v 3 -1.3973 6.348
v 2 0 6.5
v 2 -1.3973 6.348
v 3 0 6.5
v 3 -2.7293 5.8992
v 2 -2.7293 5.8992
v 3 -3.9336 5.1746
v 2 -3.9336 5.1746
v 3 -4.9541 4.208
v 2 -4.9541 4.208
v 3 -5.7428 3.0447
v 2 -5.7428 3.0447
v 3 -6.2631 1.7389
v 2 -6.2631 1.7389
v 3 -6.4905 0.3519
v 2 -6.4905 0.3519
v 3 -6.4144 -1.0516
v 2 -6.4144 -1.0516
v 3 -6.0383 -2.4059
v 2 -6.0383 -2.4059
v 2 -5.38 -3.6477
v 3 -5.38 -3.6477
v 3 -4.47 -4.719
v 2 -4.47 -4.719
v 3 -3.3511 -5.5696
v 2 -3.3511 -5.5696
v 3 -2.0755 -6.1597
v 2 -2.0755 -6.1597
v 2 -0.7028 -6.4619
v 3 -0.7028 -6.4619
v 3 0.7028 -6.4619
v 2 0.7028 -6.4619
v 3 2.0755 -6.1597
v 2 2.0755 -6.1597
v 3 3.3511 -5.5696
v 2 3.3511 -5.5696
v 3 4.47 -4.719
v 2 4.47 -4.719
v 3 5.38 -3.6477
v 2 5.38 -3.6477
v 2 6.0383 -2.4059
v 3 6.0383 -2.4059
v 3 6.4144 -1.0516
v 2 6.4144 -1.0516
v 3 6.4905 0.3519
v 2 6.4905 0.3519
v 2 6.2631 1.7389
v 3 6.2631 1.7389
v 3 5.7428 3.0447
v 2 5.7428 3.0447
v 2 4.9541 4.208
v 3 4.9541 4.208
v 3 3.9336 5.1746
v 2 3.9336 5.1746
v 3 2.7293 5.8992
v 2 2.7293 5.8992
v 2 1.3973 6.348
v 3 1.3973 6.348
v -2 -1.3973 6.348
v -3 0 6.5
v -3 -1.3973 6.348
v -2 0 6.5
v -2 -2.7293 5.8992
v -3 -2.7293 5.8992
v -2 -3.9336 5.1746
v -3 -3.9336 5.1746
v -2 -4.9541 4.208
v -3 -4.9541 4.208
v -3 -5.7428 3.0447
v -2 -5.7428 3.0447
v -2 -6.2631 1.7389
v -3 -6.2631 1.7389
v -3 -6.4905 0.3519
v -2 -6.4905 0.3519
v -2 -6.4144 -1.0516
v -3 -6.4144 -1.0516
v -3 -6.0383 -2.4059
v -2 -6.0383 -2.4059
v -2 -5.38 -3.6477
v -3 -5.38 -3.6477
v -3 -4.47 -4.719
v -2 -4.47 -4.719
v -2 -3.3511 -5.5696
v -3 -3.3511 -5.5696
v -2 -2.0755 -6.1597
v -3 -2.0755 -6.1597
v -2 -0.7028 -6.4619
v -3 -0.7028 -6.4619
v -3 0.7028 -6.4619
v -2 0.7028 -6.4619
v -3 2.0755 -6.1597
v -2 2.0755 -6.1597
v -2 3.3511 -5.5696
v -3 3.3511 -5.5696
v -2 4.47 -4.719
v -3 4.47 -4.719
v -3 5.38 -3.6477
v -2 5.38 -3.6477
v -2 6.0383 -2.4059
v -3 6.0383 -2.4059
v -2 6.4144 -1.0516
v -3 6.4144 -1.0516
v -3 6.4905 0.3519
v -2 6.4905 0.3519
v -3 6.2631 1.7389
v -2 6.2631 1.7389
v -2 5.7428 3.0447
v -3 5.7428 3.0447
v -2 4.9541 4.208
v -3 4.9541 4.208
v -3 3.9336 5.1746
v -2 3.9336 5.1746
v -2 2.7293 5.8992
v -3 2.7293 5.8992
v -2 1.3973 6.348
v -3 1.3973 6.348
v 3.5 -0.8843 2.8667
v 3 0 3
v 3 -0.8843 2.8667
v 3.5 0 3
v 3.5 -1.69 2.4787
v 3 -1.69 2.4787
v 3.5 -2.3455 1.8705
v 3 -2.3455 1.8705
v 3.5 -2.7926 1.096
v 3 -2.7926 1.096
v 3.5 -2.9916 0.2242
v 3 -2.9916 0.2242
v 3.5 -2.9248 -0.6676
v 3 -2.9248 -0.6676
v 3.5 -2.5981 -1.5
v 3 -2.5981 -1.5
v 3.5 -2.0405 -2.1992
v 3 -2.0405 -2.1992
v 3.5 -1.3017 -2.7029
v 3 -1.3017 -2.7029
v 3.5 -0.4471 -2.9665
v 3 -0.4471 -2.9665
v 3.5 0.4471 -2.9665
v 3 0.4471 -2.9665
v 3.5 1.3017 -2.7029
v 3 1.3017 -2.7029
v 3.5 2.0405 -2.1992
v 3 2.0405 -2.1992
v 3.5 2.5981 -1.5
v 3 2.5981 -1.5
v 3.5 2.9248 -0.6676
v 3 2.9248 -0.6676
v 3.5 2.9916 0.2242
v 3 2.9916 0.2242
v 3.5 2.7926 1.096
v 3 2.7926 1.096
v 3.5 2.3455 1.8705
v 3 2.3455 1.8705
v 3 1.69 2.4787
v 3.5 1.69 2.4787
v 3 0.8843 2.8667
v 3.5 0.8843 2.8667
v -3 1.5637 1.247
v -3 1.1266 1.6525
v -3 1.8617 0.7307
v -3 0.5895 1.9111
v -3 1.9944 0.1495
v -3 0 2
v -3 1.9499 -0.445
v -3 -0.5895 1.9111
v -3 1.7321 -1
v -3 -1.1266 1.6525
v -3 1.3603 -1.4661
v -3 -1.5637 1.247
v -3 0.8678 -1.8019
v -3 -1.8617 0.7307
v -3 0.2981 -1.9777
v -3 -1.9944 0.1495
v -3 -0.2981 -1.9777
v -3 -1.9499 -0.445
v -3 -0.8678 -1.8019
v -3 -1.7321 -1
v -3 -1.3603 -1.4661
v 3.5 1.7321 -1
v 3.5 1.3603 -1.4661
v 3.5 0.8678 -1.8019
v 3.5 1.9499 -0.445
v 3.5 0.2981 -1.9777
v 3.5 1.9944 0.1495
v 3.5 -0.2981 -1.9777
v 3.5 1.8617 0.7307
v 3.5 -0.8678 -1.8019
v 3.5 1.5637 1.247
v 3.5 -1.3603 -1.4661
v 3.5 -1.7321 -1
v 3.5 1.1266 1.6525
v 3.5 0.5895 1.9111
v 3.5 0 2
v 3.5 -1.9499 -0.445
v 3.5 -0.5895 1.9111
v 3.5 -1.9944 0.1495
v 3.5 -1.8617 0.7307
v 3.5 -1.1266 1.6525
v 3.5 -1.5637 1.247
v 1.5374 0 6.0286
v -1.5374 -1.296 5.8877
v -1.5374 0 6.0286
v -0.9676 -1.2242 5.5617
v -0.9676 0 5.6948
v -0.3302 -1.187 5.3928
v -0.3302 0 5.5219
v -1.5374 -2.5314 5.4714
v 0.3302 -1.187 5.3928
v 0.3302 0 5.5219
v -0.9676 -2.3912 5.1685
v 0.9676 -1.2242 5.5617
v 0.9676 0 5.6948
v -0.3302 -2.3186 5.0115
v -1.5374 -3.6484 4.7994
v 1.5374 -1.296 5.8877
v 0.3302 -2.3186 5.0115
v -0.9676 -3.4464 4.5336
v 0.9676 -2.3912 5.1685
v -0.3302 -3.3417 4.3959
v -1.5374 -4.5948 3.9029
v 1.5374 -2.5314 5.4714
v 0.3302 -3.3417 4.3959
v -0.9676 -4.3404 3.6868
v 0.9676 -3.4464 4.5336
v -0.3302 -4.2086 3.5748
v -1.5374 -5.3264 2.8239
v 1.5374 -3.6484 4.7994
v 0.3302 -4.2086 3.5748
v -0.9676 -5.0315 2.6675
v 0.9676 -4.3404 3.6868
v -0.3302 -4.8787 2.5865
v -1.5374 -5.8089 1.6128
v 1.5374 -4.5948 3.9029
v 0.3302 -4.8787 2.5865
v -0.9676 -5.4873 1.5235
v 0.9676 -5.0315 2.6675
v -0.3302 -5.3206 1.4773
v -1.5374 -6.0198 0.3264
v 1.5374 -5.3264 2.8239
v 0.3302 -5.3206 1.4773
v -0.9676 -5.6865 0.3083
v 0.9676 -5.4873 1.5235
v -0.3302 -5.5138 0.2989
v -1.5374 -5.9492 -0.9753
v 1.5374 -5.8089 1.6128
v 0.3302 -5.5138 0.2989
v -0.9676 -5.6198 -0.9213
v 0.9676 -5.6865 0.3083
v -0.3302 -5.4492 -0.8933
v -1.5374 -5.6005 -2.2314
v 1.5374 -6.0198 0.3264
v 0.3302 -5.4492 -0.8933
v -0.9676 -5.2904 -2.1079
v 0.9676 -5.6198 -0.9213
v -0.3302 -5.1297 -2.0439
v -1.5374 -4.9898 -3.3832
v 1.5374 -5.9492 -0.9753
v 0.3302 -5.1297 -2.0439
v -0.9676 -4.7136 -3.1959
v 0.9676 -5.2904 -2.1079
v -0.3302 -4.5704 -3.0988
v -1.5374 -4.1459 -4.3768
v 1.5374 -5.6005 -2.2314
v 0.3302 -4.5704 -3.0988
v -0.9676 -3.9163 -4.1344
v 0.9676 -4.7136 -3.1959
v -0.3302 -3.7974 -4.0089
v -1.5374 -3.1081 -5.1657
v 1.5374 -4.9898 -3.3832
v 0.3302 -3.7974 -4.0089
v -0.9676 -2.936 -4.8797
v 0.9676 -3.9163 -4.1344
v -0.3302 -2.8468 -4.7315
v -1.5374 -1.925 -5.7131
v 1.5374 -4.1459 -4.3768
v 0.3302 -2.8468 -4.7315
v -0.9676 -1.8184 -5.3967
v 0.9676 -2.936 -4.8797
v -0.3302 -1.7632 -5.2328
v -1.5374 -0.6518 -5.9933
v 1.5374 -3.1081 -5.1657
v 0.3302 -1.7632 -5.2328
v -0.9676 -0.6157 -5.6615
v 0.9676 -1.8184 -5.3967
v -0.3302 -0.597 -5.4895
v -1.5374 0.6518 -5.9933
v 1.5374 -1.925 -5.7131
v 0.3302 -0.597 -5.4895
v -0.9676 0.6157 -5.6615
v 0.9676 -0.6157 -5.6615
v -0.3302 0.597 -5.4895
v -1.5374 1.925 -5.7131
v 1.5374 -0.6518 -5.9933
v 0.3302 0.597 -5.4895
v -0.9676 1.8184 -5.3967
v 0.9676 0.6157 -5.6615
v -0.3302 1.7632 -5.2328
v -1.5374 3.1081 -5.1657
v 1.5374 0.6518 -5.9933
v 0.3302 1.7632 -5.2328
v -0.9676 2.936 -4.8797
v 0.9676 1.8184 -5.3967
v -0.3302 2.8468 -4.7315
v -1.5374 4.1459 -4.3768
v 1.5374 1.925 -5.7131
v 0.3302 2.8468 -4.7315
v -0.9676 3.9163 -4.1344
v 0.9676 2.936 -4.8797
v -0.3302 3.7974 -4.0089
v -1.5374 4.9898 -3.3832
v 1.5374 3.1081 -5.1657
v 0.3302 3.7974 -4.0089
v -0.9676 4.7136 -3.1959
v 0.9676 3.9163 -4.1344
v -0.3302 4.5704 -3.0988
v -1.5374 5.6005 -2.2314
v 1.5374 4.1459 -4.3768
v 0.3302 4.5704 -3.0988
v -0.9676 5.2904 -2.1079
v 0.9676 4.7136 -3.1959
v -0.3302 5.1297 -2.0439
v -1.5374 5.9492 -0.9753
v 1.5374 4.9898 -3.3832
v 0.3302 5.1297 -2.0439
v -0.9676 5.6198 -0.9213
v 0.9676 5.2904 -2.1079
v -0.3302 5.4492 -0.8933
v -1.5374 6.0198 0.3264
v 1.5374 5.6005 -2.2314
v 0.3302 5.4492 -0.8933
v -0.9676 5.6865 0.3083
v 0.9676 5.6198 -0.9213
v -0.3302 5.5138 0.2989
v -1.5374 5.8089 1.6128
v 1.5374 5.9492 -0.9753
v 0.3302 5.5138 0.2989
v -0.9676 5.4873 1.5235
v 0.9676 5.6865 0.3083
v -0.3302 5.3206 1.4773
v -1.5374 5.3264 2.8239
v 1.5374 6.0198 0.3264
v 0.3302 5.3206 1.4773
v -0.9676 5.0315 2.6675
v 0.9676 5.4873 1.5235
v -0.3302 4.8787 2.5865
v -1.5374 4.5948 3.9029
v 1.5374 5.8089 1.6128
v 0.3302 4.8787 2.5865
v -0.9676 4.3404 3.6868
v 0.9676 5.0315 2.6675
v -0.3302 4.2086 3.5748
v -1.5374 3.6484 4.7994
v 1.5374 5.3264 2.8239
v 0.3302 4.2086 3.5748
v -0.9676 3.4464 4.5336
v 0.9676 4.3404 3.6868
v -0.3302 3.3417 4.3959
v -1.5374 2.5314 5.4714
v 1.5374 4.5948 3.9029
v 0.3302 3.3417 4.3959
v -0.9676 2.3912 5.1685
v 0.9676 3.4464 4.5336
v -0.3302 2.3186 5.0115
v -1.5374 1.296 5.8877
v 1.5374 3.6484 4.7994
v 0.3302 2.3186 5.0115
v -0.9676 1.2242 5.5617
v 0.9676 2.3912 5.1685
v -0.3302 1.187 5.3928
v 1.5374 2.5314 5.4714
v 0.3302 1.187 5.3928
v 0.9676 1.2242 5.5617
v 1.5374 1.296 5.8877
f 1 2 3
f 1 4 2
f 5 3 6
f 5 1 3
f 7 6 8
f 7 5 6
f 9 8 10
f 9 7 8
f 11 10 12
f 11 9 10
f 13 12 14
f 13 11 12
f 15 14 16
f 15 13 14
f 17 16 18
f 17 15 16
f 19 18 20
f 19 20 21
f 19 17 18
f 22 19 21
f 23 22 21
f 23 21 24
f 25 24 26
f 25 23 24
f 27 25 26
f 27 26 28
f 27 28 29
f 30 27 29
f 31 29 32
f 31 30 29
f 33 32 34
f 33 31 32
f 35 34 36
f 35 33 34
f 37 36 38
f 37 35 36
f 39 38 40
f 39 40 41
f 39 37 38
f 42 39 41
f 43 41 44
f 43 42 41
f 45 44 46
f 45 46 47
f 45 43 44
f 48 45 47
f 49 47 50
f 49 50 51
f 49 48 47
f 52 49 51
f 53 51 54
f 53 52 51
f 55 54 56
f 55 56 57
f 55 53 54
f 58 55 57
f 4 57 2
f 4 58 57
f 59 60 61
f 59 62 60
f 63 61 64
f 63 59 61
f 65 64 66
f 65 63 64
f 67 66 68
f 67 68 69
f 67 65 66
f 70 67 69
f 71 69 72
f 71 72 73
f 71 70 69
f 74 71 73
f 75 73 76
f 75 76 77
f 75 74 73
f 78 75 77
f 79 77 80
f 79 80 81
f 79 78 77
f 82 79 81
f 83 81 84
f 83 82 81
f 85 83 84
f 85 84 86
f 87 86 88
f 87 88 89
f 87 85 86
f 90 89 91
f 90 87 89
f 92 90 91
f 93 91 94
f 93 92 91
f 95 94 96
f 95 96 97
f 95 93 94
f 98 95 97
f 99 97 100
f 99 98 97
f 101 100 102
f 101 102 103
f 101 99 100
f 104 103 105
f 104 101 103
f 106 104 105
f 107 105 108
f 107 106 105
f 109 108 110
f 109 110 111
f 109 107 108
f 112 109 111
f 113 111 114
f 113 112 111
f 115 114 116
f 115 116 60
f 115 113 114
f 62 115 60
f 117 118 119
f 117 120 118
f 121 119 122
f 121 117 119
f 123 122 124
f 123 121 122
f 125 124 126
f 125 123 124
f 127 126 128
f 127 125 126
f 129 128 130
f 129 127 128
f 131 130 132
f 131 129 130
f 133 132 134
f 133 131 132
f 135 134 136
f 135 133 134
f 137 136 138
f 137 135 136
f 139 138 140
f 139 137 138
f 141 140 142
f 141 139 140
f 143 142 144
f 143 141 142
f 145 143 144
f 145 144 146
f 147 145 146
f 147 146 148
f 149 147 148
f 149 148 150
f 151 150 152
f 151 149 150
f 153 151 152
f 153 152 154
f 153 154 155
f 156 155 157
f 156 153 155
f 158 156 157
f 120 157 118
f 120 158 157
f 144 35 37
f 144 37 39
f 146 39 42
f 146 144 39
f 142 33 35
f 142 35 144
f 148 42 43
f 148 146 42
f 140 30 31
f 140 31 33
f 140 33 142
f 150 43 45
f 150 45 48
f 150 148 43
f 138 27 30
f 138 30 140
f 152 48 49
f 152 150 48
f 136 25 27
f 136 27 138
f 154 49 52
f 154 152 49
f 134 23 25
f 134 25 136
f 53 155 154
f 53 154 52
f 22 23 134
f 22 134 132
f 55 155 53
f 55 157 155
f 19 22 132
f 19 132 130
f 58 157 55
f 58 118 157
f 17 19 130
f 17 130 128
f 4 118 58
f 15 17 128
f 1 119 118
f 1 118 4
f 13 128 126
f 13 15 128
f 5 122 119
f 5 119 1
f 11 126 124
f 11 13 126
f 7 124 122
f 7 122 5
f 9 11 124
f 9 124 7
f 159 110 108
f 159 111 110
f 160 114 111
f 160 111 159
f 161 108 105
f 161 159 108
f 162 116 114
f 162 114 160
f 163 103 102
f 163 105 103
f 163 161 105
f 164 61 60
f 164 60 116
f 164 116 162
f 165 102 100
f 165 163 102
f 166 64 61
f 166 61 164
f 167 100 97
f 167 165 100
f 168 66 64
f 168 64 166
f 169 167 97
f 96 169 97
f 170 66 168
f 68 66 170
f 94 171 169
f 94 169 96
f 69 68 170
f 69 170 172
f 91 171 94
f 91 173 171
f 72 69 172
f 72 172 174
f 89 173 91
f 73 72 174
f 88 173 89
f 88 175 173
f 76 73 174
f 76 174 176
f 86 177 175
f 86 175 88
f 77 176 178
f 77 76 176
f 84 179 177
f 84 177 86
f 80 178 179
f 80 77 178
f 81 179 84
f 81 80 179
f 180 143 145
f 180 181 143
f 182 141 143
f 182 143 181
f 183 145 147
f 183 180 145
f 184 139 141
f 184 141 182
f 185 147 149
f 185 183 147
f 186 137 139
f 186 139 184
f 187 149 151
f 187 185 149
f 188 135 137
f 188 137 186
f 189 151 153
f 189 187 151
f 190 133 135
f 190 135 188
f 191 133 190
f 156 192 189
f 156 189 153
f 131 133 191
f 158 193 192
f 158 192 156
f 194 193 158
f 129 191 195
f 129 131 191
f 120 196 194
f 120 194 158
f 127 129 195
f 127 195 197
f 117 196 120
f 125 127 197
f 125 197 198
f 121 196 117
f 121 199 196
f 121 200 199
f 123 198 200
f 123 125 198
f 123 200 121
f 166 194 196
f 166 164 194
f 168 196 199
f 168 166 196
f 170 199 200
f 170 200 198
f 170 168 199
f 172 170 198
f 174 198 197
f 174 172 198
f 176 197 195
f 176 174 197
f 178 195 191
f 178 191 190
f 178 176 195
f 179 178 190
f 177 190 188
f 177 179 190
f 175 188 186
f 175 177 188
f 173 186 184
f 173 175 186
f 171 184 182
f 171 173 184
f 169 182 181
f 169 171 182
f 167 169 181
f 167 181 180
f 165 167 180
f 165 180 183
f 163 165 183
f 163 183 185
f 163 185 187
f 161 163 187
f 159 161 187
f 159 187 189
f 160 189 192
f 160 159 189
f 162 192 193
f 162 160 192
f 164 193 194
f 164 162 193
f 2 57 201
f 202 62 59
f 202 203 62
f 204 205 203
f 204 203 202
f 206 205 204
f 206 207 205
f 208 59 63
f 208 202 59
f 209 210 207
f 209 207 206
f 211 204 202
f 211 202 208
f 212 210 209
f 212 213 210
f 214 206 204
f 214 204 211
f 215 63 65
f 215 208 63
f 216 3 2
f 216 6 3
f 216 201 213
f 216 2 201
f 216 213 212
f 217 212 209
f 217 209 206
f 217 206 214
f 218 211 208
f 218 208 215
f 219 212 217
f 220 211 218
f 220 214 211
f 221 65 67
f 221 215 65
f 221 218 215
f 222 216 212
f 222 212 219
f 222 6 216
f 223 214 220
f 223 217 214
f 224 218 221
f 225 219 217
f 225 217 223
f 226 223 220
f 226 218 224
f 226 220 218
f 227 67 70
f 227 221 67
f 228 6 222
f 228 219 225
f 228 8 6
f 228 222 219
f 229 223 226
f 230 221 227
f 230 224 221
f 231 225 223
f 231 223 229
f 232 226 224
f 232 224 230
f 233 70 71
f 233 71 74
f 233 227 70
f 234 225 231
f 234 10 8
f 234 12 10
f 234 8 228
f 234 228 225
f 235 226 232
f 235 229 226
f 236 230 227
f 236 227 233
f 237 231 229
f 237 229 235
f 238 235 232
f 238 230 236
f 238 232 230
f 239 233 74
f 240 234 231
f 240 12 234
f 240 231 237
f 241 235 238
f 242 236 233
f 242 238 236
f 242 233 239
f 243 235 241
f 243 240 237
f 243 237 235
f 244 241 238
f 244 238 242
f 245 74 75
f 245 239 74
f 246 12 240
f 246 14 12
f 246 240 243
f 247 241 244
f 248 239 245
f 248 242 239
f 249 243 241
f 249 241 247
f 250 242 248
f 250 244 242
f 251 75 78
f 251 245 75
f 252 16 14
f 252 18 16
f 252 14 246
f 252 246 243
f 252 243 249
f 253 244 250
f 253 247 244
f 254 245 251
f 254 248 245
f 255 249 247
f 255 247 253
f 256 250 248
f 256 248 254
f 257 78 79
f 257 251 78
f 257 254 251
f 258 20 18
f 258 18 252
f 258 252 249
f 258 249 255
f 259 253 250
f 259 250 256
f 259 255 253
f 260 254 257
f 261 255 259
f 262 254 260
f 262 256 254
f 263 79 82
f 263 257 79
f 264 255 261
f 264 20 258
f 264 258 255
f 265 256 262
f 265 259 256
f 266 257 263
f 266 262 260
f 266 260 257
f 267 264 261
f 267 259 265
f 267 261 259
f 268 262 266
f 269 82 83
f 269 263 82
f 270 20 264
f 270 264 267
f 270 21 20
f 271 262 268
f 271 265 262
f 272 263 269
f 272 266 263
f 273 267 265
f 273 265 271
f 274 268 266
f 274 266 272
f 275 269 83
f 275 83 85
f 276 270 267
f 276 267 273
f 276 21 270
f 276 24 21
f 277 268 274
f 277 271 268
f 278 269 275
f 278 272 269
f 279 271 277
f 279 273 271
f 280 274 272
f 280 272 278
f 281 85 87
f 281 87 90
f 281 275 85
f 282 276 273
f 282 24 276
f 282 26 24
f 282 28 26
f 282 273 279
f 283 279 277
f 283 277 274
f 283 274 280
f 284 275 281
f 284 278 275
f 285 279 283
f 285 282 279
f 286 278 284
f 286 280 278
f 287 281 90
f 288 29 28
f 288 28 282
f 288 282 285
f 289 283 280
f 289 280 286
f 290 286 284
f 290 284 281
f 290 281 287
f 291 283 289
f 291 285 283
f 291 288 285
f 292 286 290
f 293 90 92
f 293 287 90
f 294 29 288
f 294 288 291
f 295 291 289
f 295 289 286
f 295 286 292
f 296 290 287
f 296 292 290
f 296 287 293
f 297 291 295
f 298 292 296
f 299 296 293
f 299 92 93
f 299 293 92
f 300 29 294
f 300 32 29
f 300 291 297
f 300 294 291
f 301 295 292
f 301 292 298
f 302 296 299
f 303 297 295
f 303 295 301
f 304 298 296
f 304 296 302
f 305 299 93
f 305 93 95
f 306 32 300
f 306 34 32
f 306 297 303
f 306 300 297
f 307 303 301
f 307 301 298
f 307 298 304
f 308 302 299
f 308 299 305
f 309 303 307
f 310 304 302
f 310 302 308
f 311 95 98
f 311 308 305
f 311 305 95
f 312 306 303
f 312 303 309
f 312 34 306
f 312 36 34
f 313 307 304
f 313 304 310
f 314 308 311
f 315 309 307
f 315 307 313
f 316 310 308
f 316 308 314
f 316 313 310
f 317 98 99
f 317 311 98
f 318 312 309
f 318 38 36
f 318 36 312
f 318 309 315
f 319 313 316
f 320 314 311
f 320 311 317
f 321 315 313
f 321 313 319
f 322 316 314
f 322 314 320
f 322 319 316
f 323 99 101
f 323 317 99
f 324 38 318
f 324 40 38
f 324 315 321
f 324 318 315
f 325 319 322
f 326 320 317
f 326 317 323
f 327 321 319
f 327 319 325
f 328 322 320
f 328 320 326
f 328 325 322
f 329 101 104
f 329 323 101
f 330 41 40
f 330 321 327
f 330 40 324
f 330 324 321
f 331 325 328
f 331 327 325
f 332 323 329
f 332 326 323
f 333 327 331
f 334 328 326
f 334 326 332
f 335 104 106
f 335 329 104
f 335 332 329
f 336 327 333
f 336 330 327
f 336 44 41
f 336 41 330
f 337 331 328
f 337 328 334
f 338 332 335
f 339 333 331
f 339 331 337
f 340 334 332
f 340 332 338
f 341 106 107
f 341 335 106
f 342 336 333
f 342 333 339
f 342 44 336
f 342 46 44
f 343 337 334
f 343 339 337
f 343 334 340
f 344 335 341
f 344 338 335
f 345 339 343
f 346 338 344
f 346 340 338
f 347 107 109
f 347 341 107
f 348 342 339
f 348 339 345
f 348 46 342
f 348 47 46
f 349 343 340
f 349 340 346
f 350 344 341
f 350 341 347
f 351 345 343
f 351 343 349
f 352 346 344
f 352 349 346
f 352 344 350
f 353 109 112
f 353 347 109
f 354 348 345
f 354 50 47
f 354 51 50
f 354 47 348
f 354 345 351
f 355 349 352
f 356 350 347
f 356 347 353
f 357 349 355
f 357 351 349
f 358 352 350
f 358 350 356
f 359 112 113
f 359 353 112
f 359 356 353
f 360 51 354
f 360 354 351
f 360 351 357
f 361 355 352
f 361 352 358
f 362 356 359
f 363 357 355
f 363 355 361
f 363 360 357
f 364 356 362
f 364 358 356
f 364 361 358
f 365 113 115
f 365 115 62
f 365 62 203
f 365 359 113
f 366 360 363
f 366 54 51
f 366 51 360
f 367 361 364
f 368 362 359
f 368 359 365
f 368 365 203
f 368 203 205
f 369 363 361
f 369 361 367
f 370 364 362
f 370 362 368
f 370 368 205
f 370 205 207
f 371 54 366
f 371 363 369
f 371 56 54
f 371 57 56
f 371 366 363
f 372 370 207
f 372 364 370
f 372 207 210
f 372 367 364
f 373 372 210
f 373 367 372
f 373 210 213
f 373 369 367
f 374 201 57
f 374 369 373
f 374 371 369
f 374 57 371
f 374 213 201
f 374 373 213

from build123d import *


with BuildPart() as part:
    # Esquisse1 → Révolution1 (revolve)
    with BuildSketch(Plane.XY, mode=Mode.PRIVATE) as r_volution1_sk:
        with BuildLine():
            Line((2, 6.5), (3, 6.5))
            Line((3, 6.5), (3, 3))
            Line((3, 3), (3.5, 3))
            Line((3.5, 3), (3.5, 2))
            Line((3.5, 2), (-3, 2))
            Line((-3, 2), (-3, 6.5))
            Line((-3, 6.5), (-2, 6.5))
            ThreePointArc((-2, 6.5), (0, 5.5), (2, 6.5))
        make_face()
    revolve(r_volution1_sk.sketch.rotate(Axis((0, 0, 0), (1, 0, 0)), 90), axis=Axis((0, 0, 0), (1, 0, 0)))


solid = part.part
